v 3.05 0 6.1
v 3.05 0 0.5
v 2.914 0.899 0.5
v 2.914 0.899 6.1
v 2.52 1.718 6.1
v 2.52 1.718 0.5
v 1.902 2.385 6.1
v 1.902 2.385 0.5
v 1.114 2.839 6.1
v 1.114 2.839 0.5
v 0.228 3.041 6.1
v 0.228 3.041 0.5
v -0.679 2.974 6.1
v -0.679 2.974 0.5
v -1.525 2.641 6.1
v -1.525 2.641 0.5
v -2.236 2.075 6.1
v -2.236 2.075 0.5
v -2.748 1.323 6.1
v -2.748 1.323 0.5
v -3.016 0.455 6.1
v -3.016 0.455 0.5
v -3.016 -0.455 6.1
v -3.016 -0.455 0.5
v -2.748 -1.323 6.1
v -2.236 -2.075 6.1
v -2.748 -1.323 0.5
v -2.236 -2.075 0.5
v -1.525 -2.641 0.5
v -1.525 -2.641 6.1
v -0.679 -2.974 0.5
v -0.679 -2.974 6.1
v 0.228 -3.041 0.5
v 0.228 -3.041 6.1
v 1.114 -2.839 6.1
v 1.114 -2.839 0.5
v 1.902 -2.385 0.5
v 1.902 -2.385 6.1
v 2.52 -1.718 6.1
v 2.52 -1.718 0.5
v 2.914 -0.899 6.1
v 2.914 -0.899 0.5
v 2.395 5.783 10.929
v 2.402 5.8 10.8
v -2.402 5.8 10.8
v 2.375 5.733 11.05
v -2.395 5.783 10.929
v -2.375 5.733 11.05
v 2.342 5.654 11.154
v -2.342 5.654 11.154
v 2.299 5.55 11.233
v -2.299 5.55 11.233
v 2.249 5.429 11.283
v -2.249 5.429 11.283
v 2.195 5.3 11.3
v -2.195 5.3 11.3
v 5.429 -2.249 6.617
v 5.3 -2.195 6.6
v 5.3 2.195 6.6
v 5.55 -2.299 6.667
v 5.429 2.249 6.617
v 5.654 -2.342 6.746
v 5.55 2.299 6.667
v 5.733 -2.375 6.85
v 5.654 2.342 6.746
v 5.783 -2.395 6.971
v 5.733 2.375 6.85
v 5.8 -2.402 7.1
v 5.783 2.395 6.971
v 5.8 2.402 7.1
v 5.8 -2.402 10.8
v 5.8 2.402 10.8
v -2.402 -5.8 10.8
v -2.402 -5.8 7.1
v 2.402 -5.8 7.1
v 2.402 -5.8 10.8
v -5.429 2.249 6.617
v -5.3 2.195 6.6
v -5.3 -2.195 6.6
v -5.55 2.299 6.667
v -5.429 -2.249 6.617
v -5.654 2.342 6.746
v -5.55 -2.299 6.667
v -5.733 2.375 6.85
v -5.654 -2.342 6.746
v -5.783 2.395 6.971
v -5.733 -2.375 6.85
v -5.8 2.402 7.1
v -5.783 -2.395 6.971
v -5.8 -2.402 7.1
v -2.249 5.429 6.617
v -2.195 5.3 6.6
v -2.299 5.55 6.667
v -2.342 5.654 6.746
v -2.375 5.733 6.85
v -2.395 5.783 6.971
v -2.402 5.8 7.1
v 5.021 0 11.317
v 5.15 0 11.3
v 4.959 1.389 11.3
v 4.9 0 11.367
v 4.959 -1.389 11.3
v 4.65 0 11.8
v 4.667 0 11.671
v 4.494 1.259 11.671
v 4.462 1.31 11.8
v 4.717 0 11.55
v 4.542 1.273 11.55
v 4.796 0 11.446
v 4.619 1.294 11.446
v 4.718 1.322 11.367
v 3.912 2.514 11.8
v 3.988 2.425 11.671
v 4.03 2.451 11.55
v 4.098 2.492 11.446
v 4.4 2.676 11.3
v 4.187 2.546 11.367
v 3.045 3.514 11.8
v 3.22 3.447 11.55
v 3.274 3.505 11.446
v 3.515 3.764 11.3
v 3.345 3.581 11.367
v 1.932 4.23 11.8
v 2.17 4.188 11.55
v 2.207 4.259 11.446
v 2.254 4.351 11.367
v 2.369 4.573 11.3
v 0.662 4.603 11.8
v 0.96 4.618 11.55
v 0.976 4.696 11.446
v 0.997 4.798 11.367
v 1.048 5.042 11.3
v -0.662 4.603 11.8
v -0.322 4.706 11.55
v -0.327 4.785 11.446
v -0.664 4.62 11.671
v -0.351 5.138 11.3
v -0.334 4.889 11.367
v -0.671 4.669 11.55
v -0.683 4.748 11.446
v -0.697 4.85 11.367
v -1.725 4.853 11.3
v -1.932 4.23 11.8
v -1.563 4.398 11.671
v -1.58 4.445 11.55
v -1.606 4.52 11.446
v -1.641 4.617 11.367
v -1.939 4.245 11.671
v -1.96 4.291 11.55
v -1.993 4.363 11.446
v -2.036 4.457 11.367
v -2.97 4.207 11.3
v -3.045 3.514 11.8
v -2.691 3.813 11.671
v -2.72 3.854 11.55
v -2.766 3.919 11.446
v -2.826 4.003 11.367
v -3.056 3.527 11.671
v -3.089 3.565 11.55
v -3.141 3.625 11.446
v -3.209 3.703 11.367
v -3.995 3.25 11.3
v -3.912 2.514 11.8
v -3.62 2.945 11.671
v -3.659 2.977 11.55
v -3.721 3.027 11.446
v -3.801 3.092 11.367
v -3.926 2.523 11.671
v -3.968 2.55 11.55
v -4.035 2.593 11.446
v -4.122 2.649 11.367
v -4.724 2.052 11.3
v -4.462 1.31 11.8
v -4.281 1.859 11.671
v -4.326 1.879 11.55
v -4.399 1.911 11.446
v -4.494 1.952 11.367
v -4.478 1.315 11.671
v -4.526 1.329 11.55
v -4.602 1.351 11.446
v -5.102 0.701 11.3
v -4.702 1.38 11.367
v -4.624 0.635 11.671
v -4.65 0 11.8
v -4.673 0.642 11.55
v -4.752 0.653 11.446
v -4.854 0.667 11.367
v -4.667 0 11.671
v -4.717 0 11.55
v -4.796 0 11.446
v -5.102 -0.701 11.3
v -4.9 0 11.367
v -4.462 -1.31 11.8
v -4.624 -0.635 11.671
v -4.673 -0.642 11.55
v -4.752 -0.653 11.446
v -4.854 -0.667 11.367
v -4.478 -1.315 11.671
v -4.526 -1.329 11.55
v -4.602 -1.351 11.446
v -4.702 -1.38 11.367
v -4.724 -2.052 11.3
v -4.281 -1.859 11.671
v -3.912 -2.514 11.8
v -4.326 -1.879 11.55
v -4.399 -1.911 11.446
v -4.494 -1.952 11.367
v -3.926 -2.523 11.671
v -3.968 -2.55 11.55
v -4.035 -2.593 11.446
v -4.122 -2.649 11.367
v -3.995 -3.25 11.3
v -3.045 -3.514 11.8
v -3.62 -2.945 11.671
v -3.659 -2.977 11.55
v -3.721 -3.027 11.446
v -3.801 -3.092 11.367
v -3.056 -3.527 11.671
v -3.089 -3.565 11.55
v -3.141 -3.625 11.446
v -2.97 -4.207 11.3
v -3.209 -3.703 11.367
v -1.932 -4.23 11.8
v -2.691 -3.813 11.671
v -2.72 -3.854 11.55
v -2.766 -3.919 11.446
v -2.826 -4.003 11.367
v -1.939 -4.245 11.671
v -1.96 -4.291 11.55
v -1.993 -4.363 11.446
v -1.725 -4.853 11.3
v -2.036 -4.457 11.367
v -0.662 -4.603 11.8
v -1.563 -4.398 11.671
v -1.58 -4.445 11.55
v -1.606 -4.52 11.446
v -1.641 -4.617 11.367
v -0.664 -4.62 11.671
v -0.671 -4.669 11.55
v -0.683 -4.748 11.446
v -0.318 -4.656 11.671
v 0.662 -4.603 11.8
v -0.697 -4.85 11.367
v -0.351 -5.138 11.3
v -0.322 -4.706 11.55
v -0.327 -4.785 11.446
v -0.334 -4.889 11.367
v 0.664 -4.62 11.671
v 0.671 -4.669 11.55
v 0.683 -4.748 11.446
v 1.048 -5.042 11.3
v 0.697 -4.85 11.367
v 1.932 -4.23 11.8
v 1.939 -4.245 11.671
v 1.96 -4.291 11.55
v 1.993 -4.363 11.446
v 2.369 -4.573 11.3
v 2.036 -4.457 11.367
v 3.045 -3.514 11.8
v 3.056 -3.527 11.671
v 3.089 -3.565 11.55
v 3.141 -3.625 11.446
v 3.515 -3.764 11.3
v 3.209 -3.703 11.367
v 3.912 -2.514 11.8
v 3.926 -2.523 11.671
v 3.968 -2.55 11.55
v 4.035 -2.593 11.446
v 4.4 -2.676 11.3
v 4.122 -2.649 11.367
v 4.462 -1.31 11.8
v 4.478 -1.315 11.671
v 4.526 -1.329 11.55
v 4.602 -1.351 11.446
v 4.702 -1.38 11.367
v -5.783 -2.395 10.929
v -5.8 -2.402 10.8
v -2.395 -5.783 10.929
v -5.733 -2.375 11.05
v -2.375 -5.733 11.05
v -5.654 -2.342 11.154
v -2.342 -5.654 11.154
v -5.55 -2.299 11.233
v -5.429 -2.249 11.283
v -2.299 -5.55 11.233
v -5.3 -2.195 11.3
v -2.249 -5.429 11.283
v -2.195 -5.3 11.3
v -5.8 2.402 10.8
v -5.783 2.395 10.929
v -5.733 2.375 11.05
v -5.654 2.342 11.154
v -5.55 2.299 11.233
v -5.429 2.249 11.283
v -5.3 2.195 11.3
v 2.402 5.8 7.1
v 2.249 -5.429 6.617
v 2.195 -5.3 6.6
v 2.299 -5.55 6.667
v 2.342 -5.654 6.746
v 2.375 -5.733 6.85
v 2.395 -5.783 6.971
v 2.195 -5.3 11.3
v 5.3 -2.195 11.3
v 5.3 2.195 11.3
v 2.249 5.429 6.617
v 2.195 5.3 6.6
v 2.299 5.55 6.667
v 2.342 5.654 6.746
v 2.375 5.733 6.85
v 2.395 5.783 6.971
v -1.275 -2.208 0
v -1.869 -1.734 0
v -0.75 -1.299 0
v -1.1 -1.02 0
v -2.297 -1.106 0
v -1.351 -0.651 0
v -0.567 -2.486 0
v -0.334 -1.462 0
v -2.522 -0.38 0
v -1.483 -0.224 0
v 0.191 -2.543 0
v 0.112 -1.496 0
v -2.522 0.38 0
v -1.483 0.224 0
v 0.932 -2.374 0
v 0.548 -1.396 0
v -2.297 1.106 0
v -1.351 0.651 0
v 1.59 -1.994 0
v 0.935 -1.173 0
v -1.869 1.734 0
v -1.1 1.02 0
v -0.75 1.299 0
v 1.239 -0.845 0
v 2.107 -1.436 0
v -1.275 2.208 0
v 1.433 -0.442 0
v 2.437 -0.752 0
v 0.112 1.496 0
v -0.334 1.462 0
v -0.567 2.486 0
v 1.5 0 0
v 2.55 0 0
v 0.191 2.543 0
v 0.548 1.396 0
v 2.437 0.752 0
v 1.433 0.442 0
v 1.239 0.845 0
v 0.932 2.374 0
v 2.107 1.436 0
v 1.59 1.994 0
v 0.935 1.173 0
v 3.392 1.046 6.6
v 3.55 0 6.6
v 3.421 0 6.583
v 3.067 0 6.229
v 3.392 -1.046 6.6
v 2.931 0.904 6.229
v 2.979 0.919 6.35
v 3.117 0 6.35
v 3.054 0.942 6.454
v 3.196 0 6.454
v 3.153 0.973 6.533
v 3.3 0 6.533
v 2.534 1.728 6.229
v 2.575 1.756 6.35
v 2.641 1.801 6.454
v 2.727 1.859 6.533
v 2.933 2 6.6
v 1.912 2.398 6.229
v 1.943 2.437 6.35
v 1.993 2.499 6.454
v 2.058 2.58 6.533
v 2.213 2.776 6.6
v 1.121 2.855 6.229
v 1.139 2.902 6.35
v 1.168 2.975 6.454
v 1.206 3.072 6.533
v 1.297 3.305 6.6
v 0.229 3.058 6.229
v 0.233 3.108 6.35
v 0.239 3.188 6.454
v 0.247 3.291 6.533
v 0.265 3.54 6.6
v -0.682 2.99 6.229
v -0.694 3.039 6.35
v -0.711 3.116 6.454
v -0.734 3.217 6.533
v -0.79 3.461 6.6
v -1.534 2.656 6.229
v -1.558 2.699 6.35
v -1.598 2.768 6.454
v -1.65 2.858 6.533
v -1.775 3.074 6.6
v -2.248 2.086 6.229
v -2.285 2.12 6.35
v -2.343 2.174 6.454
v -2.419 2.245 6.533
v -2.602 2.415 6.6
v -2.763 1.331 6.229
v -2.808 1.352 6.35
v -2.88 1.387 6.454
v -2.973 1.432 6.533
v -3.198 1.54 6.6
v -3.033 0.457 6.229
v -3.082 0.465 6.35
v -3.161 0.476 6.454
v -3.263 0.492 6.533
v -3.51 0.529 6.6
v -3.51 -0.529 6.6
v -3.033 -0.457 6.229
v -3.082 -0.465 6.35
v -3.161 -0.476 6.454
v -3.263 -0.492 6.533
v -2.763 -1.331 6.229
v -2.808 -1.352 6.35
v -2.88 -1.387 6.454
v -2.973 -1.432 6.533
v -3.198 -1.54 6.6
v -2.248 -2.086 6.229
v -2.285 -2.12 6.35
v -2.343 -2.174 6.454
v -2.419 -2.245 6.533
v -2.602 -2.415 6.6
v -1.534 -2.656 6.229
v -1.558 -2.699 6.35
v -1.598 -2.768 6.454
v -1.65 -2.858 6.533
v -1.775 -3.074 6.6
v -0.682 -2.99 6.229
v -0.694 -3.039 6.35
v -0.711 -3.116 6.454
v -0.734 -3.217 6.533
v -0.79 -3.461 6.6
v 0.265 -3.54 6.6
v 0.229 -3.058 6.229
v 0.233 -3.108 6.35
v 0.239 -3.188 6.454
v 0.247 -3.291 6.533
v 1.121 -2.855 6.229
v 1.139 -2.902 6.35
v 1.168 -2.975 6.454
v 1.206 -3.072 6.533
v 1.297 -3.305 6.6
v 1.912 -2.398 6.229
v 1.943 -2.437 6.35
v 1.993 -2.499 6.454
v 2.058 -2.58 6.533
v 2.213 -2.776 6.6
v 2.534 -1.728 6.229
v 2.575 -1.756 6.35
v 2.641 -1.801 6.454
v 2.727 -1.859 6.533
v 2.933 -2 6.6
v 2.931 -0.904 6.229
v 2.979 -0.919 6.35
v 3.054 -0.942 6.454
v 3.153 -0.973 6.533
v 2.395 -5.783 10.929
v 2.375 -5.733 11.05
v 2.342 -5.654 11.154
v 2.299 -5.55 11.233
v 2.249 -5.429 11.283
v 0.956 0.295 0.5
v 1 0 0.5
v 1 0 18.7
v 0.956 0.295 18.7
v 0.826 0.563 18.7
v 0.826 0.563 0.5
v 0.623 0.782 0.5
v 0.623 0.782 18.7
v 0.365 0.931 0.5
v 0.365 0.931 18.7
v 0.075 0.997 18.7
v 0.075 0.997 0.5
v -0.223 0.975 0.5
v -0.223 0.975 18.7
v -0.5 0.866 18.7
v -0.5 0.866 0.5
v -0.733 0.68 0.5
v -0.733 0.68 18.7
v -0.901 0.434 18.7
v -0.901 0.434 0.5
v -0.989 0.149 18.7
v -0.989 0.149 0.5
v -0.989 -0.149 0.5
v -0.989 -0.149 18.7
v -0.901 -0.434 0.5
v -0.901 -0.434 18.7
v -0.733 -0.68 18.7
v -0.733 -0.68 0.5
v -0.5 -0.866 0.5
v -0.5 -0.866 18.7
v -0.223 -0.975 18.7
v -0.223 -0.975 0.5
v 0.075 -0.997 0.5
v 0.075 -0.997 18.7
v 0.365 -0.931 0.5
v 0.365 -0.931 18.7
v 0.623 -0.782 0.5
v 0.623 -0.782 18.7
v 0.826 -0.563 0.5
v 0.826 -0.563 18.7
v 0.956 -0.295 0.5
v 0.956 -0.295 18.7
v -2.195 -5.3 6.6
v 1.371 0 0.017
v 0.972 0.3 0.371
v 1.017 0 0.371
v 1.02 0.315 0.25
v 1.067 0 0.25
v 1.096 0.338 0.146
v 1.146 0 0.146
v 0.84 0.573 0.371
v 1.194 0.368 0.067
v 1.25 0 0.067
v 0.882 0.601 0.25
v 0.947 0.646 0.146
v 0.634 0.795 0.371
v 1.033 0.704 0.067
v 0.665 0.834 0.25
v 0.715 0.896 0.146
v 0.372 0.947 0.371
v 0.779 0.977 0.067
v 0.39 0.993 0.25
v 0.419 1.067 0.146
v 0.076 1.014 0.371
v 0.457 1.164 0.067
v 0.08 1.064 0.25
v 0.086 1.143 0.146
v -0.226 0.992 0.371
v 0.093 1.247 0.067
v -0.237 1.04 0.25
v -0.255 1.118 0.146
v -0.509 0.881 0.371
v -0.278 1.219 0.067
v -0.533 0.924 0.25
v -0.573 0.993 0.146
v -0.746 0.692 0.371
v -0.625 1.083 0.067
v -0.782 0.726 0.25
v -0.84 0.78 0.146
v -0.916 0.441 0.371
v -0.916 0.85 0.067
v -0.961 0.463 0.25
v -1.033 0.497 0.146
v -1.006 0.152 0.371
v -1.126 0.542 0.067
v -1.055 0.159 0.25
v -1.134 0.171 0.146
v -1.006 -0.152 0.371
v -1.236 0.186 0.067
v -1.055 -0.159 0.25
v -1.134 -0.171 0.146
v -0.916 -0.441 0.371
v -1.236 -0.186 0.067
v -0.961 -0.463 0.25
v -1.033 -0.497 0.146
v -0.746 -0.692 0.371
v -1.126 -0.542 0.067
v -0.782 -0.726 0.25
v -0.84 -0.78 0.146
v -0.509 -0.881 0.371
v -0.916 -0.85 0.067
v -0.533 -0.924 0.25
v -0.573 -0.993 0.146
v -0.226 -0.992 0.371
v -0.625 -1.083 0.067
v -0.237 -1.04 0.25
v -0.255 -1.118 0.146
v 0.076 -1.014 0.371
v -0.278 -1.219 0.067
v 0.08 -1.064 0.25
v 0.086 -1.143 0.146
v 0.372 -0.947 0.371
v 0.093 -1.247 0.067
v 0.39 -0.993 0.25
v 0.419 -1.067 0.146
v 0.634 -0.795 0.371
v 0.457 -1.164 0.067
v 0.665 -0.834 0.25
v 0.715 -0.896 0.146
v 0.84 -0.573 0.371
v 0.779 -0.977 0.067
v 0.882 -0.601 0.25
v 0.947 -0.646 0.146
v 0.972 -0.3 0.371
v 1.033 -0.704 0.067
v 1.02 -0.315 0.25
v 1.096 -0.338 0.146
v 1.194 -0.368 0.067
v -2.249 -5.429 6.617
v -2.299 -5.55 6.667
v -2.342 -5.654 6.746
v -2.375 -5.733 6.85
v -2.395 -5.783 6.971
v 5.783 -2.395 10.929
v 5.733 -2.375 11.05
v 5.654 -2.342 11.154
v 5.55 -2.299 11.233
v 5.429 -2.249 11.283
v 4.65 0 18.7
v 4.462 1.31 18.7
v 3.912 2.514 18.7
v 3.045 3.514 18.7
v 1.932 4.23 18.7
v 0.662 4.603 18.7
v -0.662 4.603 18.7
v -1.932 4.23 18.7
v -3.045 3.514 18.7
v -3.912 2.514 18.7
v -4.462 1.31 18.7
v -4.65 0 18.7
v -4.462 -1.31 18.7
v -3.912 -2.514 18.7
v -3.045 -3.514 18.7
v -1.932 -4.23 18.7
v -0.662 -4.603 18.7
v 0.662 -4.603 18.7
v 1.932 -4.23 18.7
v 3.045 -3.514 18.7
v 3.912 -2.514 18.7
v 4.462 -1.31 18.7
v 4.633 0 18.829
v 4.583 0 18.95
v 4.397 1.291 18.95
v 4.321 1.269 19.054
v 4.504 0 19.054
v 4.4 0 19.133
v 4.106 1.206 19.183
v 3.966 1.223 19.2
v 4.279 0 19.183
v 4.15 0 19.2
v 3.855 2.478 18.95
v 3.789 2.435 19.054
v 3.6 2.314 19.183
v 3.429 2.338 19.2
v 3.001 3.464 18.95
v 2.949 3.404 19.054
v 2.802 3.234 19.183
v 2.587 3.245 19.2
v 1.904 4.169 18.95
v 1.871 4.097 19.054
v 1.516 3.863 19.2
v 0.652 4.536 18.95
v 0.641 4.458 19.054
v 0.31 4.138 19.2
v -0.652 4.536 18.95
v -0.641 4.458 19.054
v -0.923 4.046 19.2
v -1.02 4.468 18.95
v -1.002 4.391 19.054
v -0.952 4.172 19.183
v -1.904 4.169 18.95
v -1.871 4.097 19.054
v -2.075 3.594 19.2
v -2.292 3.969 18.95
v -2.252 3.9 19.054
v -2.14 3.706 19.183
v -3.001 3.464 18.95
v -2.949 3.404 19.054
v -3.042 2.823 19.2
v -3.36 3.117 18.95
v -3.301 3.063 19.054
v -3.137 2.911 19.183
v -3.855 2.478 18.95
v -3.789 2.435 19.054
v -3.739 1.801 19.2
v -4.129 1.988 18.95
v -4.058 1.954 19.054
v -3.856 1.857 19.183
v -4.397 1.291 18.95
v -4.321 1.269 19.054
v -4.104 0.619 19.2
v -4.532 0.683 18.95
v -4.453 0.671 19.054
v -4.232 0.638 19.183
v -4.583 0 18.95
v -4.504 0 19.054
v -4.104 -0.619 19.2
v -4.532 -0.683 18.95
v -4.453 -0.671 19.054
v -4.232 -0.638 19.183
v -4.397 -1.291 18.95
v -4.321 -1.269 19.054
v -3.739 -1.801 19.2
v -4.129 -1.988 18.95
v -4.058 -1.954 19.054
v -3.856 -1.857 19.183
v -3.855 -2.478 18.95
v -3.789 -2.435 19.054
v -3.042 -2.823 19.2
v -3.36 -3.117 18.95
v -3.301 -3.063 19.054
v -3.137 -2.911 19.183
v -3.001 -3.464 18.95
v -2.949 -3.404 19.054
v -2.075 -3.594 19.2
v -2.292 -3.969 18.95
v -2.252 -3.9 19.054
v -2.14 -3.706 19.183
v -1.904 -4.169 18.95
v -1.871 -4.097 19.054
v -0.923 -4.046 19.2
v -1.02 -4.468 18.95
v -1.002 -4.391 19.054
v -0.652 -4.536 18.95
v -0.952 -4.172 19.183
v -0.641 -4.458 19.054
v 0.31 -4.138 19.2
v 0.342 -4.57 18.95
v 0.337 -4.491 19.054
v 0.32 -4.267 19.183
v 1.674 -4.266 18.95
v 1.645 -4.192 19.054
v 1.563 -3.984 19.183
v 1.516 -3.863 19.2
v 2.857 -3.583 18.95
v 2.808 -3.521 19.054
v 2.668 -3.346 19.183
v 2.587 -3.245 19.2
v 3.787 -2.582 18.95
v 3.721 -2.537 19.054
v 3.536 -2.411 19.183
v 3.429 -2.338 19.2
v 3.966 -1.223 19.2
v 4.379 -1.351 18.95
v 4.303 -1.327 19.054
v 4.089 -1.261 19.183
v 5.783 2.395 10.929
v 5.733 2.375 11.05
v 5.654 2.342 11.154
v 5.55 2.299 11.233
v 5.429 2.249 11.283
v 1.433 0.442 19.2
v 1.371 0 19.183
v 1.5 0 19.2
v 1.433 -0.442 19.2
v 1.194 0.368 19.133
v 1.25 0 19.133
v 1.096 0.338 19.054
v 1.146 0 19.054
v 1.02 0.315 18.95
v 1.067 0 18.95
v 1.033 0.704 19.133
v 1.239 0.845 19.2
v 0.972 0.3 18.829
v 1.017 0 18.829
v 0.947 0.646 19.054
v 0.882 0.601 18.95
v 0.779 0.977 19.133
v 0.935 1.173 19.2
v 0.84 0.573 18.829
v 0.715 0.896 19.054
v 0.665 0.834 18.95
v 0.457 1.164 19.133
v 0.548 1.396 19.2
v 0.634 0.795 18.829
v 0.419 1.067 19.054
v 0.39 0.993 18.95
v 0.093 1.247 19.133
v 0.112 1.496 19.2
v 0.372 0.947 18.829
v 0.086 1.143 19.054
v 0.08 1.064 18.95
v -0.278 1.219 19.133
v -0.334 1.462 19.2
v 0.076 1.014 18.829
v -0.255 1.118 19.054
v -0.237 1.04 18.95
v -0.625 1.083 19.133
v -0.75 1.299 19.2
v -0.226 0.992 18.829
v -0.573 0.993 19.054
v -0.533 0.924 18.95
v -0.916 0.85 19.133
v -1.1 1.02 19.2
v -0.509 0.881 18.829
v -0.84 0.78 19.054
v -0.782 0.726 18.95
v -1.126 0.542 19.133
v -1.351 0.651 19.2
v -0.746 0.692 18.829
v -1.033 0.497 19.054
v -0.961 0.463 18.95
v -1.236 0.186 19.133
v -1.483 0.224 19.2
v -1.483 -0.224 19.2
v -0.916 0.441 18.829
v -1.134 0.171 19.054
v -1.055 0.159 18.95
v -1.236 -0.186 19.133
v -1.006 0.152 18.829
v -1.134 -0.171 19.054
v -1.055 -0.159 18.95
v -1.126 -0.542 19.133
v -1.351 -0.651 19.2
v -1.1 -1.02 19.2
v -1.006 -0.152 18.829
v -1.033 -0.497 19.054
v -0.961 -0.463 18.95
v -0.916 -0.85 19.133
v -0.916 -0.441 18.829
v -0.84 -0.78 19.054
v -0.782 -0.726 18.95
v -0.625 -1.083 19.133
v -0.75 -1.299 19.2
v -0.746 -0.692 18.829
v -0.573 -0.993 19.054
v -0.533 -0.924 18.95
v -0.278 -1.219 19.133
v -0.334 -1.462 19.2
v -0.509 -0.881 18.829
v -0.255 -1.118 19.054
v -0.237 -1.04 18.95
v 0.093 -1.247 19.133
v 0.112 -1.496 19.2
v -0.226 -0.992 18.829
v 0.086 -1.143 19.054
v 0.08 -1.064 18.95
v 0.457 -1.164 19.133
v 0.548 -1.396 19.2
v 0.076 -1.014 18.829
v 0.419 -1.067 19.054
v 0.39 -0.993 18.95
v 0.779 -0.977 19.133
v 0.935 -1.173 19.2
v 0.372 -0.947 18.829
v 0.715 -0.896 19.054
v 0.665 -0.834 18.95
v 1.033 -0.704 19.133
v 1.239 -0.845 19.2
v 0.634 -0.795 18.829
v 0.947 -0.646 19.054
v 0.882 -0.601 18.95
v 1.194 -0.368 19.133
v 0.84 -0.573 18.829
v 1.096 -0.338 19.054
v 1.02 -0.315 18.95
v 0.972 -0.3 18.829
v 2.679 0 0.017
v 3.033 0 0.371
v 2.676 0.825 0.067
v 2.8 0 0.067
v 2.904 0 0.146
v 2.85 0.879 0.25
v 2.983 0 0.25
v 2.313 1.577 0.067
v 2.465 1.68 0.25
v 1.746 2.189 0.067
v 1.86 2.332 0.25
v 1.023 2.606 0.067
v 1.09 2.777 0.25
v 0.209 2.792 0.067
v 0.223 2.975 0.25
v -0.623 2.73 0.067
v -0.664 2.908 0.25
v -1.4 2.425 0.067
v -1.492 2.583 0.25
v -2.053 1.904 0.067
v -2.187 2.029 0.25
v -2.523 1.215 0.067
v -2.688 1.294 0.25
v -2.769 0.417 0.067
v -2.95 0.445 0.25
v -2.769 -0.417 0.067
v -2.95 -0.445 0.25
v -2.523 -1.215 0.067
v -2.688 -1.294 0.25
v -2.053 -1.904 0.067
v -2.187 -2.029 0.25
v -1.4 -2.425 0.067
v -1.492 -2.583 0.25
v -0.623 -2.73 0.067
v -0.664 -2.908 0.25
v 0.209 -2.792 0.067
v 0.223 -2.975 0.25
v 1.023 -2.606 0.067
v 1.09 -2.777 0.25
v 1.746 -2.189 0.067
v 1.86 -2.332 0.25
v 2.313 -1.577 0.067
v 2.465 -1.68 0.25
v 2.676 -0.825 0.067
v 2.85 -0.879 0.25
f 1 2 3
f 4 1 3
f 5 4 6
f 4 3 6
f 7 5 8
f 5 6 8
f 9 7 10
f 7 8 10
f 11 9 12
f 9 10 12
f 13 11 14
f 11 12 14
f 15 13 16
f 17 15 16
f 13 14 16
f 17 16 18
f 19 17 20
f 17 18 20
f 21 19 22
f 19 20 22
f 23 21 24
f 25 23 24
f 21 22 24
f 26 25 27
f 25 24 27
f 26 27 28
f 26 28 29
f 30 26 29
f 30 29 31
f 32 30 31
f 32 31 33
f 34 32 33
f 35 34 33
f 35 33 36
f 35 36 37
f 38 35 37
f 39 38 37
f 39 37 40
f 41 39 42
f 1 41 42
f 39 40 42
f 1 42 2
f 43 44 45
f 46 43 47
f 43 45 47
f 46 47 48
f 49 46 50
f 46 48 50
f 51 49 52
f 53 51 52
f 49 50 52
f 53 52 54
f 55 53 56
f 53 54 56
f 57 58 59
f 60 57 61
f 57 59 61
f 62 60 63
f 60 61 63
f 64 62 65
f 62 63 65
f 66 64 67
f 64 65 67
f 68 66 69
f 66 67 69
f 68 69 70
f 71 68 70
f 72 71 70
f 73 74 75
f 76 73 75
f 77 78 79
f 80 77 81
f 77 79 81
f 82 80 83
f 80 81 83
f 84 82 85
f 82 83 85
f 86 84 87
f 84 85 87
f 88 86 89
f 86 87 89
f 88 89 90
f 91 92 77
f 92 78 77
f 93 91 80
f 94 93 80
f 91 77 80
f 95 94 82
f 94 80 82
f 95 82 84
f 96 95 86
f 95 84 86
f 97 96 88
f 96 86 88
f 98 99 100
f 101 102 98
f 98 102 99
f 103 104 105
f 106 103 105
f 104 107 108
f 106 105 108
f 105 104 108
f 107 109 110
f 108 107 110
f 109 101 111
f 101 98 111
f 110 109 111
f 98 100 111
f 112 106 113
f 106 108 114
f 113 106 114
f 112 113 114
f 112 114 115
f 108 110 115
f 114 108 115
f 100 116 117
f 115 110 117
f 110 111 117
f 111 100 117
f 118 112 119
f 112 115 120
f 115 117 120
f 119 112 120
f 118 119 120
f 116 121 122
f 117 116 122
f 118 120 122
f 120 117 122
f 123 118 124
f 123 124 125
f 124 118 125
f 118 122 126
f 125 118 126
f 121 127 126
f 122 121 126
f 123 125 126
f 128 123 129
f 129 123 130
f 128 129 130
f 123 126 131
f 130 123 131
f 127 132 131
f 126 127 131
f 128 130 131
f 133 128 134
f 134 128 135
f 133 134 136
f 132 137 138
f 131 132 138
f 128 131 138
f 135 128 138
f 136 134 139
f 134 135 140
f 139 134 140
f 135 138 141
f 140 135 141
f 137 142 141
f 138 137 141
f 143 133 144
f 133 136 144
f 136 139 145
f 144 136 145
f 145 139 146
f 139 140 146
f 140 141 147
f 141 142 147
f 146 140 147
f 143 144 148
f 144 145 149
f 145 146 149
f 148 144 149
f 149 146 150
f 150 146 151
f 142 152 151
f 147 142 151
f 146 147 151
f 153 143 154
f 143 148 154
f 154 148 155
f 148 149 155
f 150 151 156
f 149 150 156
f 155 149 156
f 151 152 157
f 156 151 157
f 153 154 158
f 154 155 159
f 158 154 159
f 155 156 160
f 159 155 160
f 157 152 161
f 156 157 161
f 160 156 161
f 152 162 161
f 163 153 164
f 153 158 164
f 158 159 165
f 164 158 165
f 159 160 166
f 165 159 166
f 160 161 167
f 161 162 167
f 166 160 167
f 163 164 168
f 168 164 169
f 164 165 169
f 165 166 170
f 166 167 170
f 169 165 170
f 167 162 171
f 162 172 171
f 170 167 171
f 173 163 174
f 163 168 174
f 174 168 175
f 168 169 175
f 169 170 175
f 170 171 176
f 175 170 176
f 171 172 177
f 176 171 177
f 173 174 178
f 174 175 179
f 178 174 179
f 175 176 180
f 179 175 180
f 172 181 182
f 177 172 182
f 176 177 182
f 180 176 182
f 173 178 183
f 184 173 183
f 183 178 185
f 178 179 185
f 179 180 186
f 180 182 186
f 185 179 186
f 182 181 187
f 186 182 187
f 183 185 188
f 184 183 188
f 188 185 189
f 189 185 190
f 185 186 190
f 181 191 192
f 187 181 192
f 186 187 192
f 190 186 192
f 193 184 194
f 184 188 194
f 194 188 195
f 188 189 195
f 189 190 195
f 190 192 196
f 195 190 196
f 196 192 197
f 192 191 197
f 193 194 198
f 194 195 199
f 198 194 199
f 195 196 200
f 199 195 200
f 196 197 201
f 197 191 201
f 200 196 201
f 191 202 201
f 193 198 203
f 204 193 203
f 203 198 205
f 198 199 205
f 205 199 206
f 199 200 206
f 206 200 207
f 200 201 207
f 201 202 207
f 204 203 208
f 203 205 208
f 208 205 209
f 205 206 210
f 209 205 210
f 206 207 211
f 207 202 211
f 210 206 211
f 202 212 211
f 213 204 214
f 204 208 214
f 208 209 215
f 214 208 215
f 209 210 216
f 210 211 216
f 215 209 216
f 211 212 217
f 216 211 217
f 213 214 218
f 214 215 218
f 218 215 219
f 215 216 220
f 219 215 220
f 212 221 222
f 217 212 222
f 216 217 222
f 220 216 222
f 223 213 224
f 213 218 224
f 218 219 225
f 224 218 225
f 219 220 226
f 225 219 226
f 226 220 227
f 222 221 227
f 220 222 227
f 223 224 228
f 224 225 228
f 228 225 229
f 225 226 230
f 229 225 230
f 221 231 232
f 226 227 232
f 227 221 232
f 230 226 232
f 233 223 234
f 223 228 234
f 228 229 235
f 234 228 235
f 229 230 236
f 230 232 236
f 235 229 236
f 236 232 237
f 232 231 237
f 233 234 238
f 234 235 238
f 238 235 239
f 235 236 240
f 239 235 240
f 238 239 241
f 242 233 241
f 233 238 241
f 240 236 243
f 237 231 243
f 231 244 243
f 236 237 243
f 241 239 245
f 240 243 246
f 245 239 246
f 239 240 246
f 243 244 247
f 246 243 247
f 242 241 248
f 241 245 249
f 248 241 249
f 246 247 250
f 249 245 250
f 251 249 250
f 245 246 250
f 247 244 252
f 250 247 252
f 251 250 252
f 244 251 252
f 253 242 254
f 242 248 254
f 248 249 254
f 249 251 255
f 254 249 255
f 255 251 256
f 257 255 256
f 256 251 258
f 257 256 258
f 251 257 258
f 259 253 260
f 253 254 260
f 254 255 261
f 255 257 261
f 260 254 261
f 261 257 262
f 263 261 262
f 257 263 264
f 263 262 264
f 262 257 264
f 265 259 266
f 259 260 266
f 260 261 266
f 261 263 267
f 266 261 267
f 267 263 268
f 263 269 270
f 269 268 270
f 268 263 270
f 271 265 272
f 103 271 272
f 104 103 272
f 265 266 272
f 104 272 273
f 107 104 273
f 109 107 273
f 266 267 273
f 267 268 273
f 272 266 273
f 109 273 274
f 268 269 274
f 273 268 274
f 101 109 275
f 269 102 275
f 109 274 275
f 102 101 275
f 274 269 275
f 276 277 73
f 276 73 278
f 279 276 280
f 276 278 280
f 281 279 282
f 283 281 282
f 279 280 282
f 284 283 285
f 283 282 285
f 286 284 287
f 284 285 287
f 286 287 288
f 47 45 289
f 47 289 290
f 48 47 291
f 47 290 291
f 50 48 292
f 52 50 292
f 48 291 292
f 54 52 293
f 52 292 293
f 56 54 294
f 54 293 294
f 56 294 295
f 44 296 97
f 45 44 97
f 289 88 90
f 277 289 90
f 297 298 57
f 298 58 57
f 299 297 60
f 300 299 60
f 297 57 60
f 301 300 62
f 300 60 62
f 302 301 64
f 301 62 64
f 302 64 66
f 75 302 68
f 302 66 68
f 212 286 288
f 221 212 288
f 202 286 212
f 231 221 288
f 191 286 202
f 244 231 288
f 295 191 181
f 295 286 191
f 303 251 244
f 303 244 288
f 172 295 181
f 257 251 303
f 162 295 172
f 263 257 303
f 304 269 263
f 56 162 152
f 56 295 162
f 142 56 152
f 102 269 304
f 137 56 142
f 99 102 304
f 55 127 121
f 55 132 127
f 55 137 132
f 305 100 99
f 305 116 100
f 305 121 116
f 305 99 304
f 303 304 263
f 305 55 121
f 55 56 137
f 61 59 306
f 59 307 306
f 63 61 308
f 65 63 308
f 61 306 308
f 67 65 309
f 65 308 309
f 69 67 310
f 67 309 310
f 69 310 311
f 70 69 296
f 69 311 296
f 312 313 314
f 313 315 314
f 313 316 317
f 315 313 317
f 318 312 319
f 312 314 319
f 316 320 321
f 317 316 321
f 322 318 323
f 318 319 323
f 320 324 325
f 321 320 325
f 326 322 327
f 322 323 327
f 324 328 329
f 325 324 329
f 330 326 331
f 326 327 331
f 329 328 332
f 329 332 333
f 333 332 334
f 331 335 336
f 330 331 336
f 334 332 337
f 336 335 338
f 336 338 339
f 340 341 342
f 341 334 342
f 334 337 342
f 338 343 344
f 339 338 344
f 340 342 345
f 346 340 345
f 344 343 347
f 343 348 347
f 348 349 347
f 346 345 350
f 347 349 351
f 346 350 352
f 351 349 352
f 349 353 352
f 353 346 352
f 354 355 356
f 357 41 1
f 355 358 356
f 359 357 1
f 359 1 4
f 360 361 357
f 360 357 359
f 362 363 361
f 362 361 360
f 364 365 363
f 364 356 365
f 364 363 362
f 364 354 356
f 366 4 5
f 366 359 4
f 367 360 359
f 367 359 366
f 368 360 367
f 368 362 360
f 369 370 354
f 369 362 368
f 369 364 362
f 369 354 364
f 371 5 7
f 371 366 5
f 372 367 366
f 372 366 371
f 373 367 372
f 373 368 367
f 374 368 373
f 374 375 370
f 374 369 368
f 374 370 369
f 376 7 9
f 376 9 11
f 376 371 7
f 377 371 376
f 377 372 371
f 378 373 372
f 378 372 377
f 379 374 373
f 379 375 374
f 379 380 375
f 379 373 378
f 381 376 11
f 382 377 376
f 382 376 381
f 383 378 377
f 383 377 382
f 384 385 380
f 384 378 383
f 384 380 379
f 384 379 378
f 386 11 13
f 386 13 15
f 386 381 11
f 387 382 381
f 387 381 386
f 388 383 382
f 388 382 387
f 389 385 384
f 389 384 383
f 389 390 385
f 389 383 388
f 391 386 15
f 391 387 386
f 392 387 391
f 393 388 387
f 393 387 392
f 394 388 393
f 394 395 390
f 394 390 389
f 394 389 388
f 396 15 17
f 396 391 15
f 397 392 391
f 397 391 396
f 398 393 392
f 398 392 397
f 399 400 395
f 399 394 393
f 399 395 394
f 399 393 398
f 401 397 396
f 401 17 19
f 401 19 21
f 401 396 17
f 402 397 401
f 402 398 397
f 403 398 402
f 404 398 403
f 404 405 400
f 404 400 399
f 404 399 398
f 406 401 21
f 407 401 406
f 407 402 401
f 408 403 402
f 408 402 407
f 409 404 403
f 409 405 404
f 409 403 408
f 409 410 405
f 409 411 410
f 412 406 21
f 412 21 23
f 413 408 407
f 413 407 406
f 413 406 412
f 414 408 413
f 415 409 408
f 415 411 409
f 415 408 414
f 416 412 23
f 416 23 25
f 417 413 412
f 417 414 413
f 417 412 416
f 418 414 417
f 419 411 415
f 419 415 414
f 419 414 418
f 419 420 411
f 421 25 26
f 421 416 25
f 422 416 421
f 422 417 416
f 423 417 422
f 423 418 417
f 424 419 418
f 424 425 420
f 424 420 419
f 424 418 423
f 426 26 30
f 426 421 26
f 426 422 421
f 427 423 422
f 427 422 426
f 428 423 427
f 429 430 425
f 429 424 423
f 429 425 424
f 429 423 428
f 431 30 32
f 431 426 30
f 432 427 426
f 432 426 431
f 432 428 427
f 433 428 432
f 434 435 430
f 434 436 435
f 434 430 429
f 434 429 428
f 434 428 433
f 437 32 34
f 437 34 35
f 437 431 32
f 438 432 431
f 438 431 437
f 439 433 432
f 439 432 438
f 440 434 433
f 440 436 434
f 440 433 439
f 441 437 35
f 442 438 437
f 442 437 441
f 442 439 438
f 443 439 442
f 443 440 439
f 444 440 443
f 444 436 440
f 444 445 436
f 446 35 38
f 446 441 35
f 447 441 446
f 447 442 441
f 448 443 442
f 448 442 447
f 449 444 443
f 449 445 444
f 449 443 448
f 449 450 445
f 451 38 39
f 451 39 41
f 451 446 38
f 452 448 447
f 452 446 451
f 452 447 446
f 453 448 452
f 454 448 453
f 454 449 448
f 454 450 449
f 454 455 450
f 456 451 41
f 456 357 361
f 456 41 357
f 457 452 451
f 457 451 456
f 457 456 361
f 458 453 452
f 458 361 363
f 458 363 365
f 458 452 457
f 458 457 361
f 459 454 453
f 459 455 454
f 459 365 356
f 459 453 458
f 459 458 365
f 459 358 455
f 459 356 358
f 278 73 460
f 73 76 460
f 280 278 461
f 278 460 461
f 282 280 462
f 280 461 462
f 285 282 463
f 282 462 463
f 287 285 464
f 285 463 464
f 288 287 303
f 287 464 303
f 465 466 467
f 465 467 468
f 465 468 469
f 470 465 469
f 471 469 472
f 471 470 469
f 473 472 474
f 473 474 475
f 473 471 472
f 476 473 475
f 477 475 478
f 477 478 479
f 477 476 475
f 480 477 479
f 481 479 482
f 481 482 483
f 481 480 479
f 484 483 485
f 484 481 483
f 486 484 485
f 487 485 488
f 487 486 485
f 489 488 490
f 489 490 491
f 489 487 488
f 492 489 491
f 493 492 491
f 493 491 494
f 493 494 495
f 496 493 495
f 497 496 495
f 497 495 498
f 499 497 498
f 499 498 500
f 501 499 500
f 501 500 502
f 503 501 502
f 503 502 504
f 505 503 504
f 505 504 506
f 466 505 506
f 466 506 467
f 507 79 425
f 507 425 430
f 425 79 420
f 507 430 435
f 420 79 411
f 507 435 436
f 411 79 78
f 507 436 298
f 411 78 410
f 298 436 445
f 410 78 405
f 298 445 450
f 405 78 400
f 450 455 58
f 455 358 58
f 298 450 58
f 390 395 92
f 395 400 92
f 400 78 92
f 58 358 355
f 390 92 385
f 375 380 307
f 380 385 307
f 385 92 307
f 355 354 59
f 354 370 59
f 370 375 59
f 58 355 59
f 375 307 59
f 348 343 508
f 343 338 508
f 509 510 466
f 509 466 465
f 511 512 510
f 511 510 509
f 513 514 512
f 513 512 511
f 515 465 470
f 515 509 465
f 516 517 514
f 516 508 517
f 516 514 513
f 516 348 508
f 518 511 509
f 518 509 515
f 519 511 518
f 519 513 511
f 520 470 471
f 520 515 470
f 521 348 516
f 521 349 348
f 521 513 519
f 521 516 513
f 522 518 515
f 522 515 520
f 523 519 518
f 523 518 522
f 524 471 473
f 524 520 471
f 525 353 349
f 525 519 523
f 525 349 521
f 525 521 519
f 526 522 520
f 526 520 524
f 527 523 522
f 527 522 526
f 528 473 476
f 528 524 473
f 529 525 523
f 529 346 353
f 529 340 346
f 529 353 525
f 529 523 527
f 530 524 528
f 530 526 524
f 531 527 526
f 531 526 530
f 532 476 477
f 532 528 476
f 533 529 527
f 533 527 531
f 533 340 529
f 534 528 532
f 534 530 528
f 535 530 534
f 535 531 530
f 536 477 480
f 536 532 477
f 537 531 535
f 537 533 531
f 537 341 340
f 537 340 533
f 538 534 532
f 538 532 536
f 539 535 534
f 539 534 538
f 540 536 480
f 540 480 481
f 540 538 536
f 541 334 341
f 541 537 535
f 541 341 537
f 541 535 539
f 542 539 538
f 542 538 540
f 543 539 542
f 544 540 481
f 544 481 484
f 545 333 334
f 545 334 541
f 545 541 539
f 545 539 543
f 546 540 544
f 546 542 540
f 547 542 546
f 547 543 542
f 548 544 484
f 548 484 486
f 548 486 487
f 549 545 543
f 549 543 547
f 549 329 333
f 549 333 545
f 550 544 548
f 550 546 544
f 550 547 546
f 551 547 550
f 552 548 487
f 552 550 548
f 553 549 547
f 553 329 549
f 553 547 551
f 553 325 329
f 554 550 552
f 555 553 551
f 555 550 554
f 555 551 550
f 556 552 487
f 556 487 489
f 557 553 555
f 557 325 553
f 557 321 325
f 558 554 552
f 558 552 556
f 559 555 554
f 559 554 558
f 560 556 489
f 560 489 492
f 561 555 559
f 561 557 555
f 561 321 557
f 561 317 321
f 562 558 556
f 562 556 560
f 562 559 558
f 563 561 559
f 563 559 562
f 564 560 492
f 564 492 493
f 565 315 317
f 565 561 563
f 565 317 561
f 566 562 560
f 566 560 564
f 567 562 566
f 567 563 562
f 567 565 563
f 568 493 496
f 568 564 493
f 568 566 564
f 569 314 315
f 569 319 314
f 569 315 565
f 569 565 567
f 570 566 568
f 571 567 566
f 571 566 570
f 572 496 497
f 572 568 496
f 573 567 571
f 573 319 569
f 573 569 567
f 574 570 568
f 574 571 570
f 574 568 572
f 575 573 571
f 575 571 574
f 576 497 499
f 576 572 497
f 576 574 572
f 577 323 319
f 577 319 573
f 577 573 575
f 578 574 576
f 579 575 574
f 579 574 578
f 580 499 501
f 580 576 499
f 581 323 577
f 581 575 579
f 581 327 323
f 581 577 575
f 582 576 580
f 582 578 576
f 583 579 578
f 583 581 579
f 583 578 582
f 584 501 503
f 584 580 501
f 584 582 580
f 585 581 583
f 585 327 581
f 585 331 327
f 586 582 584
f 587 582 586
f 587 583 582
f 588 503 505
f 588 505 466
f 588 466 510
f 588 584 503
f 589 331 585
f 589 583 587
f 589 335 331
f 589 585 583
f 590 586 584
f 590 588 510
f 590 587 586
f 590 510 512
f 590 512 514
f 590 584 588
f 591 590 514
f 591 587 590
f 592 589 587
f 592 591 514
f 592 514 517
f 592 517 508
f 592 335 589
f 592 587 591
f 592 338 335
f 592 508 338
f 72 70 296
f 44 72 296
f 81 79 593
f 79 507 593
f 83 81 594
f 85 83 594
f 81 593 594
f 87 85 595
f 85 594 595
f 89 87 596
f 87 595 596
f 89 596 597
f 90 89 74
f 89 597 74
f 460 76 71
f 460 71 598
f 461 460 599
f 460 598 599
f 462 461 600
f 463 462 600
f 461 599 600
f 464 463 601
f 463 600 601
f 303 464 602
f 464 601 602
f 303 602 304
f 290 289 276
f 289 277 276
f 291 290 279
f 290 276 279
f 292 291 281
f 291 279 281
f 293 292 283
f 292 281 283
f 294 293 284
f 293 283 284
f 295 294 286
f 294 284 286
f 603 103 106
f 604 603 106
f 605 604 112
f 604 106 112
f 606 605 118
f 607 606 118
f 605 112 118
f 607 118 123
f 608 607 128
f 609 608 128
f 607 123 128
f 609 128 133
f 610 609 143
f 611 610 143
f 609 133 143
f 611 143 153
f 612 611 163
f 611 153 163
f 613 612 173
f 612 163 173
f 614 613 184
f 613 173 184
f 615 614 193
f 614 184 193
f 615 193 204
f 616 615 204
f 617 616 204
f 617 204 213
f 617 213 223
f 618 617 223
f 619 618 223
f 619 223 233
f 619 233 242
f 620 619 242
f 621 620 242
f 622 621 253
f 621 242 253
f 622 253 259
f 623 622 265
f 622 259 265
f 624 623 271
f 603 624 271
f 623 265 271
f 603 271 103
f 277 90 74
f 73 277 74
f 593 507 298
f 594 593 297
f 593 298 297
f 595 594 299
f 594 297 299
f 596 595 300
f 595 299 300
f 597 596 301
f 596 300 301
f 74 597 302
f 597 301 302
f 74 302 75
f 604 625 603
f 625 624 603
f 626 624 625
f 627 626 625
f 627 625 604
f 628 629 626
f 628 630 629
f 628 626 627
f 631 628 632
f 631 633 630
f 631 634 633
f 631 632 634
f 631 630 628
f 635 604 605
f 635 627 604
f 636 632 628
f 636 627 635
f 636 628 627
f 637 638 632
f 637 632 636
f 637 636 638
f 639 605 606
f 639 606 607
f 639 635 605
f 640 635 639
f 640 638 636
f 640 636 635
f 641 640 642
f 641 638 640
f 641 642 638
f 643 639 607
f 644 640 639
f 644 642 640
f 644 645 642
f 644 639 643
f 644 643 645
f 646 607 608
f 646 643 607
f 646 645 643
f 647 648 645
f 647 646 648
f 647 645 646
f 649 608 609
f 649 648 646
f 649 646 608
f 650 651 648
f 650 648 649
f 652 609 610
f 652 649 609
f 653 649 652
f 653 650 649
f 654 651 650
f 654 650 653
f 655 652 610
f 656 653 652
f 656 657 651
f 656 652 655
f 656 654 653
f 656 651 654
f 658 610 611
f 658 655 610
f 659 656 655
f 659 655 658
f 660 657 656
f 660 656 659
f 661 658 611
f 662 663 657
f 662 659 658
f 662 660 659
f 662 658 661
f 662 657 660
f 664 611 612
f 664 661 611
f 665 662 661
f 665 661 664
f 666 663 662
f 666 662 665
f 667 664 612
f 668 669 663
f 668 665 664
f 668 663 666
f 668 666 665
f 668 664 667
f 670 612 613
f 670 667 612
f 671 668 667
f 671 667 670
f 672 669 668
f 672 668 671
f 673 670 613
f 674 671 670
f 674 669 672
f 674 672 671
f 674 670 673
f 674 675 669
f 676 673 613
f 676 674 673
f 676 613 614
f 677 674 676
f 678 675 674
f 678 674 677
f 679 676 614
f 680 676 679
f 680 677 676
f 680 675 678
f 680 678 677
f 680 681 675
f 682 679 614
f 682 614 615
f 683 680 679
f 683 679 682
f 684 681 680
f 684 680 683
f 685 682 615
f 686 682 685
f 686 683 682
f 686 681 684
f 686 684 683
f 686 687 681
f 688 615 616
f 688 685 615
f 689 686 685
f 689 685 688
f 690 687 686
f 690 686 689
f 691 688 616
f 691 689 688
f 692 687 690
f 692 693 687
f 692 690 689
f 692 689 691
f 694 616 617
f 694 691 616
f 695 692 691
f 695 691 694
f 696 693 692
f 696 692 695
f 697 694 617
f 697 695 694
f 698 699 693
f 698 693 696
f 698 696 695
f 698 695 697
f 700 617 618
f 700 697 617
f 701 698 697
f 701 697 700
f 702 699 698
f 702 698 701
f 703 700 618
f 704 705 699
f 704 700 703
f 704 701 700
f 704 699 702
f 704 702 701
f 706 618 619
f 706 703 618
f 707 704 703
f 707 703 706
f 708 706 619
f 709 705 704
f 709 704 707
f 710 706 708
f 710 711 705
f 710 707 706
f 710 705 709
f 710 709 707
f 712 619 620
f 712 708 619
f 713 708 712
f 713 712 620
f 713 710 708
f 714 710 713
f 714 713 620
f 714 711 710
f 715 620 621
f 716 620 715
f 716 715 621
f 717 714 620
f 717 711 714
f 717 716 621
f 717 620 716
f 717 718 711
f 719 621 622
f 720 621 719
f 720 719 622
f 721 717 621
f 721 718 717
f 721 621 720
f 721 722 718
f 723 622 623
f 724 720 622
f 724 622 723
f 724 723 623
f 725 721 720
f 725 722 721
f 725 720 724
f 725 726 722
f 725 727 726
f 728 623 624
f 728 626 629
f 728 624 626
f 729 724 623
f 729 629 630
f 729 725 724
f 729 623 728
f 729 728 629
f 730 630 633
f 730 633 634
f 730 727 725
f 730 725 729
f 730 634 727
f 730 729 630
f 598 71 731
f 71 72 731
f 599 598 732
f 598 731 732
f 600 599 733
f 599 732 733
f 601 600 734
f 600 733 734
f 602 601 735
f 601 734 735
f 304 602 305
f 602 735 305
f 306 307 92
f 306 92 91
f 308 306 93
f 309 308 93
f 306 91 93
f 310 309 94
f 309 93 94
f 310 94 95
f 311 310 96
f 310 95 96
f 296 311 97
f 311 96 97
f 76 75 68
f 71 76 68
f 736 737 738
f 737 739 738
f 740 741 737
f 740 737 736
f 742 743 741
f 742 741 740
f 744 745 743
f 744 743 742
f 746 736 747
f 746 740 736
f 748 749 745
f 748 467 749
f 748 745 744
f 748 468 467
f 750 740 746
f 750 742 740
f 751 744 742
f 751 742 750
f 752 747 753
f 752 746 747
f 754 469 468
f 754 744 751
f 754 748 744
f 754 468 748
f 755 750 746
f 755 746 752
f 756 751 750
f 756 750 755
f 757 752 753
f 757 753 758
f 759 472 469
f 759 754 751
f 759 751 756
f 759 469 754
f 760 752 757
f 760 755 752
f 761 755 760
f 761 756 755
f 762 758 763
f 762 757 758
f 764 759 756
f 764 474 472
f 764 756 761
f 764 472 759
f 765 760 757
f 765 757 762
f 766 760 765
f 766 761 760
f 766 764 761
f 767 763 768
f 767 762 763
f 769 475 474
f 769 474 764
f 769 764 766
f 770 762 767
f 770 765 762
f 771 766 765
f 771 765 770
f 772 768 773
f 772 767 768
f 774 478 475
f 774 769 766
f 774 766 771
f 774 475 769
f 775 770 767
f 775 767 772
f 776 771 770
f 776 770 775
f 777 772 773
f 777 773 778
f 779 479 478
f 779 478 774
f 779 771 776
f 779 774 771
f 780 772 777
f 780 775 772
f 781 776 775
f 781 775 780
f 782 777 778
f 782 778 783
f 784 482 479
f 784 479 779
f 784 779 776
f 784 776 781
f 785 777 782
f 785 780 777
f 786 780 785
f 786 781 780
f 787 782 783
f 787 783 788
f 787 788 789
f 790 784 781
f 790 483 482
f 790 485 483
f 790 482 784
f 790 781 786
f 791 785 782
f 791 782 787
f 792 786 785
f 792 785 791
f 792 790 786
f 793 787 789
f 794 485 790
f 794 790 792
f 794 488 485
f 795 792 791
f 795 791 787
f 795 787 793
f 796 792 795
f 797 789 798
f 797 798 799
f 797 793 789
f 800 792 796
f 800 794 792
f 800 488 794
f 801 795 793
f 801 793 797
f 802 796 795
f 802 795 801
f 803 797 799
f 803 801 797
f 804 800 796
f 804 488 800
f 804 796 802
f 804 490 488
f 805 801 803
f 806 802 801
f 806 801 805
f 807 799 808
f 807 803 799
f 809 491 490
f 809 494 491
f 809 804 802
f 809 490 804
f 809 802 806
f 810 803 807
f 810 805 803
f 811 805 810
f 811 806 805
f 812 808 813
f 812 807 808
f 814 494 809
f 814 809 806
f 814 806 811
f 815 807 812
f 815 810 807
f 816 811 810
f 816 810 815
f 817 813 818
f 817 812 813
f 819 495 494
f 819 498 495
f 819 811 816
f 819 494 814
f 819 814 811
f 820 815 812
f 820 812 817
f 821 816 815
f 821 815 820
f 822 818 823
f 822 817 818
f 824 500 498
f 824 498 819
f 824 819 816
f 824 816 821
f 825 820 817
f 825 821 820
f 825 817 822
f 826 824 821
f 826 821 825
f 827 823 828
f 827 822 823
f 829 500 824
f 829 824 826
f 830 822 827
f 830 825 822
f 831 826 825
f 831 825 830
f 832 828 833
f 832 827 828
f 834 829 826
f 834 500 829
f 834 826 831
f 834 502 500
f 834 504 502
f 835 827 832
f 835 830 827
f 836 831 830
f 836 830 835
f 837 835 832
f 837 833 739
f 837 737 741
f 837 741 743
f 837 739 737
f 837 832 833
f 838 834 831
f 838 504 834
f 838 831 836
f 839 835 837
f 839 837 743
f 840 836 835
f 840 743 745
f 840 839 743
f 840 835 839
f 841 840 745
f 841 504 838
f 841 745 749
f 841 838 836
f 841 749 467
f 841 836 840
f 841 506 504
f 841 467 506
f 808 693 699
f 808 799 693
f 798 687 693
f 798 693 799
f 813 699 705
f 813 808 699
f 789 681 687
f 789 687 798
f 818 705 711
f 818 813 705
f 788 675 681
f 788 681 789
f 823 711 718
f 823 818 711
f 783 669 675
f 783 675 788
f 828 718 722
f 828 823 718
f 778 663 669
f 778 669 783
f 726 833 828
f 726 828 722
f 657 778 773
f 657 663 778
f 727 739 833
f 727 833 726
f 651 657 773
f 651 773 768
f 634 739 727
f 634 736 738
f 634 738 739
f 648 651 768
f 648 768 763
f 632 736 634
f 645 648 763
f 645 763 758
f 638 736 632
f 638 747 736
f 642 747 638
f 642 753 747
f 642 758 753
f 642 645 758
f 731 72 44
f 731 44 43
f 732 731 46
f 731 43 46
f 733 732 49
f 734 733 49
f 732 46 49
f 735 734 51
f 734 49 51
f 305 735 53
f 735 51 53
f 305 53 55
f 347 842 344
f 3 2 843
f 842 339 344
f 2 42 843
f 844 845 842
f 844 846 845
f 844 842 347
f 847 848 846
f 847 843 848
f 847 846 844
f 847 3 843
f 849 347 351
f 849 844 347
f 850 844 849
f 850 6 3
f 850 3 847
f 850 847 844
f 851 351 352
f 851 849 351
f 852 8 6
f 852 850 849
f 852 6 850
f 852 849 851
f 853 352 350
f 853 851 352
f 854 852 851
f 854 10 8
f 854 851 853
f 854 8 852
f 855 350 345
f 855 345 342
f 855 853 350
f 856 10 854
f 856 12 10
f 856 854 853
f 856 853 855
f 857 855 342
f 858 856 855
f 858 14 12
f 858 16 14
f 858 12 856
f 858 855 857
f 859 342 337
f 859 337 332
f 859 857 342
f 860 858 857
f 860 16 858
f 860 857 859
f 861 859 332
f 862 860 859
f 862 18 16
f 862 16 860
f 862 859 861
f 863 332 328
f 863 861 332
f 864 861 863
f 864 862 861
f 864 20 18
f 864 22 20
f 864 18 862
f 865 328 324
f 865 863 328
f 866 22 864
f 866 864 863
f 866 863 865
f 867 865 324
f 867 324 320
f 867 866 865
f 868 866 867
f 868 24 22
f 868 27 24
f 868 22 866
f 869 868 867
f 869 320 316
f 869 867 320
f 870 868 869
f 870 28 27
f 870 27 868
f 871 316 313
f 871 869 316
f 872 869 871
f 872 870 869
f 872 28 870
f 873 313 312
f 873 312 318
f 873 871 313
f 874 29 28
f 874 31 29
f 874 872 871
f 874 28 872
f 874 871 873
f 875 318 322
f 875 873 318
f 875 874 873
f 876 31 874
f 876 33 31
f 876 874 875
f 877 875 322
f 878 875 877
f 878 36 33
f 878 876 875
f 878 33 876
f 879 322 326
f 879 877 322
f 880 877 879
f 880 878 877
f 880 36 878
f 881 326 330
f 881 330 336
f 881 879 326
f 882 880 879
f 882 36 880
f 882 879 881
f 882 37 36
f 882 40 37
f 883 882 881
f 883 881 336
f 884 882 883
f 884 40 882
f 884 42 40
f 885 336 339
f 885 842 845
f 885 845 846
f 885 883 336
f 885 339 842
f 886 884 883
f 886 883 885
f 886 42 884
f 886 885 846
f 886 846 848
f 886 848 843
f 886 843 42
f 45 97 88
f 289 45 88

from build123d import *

# Parameters (mm, degrees)
SKETCH1_R           = 3.05
SKETCH1_R_2         = 1
BOSS_EXTRUDE1_DEPTH = 6.6
SKETCH2_R           = 1
BOSS_EXTRUDE2_DEPTH = 4.7
SKETCH3_R           = 4.65
SKETCH3_R_2         = 1
BOSS_EXTRUDE3_DEPTH = 7.9
FILLET1_R           = 0.5


with BuildPart() as part:
    # Sketch1 → Boss-Extrude1 (new body)
    with BuildSketch(Plane.XY):
        Circle(SKETCH1_R)
        Circle(SKETCH1_R_2, mode=Mode.SUBTRACT)
    extrude(amount=BOSS_EXTRUDE1_DEPTH)

    # Sketch2 → Boss-Extrude2 (add)
    with BuildSketch(Plane.XY.offset(6.6)):
        Polygon((5.8, -2.402438662), (5.8, 2.402438662), (2.402438662, 5.8), (-2.402438662, 5.8), (-5.8, 2.402438662), (-5.8, -2.402438662), (-2.402438662, -5.8), (2.402438662, -5.8), align=None)
        Circle(SKETCH2_R, mode=Mode.SUBTRACT)
    extrude(amount=BOSS_EXTRUDE2_DEPTH)

    # Sketch3 → Boss-Extrude3 (add)
    with BuildSketch(Plane.XY.offset(11.3)):
        Circle(SKETCH3_R)
        Circle(SKETCH3_R_2, mode=Mode.SUBTRACT)
    extrude(amount=BOSS_EXTRUDE3_DEPTH)

    # Fillet1
    fillet1_edges = [part.edges().sort_by_distance(p)[0] for p in [
        (-4.101219331, 4.101219331, 11.3),
        (-5.8, 0, 11.3),
        (-4.101219331, -4.101219331, 11.3),
        (0, -5.8, 11.3),
        (4.101219331, -4.101219331, 11.3),
        (5.8, 0, 11.3),
        (4.101219331, 4.101219331, 11.3),
        (0, 5.8, 11.3),
        (-4.101219331, 4.101219331, 6.6),
        (-5.8, 0, 6.6),
        (-4.101219331, -4.101219331, 6.6),
        (0, -5.8, 6.6),
        (4.101219331, -4.101219331, 6.6),
        (5.8, 0, 6.6),
        (4.101219331, 4.101219331, 6.6),
        (0, 5.8, 6.6),
        (-3.05, 0, 0),
        (-4.65, 0, 11.3),
        (-4.65, 0, 19.2),
        (-1, 0, 19.2),
        (-3.05, 0, 6.6),
        (-1, 0, 0),
    ]]
    fillet(fillet1_edges, radius=FILLET1_R)


solid = part.part
